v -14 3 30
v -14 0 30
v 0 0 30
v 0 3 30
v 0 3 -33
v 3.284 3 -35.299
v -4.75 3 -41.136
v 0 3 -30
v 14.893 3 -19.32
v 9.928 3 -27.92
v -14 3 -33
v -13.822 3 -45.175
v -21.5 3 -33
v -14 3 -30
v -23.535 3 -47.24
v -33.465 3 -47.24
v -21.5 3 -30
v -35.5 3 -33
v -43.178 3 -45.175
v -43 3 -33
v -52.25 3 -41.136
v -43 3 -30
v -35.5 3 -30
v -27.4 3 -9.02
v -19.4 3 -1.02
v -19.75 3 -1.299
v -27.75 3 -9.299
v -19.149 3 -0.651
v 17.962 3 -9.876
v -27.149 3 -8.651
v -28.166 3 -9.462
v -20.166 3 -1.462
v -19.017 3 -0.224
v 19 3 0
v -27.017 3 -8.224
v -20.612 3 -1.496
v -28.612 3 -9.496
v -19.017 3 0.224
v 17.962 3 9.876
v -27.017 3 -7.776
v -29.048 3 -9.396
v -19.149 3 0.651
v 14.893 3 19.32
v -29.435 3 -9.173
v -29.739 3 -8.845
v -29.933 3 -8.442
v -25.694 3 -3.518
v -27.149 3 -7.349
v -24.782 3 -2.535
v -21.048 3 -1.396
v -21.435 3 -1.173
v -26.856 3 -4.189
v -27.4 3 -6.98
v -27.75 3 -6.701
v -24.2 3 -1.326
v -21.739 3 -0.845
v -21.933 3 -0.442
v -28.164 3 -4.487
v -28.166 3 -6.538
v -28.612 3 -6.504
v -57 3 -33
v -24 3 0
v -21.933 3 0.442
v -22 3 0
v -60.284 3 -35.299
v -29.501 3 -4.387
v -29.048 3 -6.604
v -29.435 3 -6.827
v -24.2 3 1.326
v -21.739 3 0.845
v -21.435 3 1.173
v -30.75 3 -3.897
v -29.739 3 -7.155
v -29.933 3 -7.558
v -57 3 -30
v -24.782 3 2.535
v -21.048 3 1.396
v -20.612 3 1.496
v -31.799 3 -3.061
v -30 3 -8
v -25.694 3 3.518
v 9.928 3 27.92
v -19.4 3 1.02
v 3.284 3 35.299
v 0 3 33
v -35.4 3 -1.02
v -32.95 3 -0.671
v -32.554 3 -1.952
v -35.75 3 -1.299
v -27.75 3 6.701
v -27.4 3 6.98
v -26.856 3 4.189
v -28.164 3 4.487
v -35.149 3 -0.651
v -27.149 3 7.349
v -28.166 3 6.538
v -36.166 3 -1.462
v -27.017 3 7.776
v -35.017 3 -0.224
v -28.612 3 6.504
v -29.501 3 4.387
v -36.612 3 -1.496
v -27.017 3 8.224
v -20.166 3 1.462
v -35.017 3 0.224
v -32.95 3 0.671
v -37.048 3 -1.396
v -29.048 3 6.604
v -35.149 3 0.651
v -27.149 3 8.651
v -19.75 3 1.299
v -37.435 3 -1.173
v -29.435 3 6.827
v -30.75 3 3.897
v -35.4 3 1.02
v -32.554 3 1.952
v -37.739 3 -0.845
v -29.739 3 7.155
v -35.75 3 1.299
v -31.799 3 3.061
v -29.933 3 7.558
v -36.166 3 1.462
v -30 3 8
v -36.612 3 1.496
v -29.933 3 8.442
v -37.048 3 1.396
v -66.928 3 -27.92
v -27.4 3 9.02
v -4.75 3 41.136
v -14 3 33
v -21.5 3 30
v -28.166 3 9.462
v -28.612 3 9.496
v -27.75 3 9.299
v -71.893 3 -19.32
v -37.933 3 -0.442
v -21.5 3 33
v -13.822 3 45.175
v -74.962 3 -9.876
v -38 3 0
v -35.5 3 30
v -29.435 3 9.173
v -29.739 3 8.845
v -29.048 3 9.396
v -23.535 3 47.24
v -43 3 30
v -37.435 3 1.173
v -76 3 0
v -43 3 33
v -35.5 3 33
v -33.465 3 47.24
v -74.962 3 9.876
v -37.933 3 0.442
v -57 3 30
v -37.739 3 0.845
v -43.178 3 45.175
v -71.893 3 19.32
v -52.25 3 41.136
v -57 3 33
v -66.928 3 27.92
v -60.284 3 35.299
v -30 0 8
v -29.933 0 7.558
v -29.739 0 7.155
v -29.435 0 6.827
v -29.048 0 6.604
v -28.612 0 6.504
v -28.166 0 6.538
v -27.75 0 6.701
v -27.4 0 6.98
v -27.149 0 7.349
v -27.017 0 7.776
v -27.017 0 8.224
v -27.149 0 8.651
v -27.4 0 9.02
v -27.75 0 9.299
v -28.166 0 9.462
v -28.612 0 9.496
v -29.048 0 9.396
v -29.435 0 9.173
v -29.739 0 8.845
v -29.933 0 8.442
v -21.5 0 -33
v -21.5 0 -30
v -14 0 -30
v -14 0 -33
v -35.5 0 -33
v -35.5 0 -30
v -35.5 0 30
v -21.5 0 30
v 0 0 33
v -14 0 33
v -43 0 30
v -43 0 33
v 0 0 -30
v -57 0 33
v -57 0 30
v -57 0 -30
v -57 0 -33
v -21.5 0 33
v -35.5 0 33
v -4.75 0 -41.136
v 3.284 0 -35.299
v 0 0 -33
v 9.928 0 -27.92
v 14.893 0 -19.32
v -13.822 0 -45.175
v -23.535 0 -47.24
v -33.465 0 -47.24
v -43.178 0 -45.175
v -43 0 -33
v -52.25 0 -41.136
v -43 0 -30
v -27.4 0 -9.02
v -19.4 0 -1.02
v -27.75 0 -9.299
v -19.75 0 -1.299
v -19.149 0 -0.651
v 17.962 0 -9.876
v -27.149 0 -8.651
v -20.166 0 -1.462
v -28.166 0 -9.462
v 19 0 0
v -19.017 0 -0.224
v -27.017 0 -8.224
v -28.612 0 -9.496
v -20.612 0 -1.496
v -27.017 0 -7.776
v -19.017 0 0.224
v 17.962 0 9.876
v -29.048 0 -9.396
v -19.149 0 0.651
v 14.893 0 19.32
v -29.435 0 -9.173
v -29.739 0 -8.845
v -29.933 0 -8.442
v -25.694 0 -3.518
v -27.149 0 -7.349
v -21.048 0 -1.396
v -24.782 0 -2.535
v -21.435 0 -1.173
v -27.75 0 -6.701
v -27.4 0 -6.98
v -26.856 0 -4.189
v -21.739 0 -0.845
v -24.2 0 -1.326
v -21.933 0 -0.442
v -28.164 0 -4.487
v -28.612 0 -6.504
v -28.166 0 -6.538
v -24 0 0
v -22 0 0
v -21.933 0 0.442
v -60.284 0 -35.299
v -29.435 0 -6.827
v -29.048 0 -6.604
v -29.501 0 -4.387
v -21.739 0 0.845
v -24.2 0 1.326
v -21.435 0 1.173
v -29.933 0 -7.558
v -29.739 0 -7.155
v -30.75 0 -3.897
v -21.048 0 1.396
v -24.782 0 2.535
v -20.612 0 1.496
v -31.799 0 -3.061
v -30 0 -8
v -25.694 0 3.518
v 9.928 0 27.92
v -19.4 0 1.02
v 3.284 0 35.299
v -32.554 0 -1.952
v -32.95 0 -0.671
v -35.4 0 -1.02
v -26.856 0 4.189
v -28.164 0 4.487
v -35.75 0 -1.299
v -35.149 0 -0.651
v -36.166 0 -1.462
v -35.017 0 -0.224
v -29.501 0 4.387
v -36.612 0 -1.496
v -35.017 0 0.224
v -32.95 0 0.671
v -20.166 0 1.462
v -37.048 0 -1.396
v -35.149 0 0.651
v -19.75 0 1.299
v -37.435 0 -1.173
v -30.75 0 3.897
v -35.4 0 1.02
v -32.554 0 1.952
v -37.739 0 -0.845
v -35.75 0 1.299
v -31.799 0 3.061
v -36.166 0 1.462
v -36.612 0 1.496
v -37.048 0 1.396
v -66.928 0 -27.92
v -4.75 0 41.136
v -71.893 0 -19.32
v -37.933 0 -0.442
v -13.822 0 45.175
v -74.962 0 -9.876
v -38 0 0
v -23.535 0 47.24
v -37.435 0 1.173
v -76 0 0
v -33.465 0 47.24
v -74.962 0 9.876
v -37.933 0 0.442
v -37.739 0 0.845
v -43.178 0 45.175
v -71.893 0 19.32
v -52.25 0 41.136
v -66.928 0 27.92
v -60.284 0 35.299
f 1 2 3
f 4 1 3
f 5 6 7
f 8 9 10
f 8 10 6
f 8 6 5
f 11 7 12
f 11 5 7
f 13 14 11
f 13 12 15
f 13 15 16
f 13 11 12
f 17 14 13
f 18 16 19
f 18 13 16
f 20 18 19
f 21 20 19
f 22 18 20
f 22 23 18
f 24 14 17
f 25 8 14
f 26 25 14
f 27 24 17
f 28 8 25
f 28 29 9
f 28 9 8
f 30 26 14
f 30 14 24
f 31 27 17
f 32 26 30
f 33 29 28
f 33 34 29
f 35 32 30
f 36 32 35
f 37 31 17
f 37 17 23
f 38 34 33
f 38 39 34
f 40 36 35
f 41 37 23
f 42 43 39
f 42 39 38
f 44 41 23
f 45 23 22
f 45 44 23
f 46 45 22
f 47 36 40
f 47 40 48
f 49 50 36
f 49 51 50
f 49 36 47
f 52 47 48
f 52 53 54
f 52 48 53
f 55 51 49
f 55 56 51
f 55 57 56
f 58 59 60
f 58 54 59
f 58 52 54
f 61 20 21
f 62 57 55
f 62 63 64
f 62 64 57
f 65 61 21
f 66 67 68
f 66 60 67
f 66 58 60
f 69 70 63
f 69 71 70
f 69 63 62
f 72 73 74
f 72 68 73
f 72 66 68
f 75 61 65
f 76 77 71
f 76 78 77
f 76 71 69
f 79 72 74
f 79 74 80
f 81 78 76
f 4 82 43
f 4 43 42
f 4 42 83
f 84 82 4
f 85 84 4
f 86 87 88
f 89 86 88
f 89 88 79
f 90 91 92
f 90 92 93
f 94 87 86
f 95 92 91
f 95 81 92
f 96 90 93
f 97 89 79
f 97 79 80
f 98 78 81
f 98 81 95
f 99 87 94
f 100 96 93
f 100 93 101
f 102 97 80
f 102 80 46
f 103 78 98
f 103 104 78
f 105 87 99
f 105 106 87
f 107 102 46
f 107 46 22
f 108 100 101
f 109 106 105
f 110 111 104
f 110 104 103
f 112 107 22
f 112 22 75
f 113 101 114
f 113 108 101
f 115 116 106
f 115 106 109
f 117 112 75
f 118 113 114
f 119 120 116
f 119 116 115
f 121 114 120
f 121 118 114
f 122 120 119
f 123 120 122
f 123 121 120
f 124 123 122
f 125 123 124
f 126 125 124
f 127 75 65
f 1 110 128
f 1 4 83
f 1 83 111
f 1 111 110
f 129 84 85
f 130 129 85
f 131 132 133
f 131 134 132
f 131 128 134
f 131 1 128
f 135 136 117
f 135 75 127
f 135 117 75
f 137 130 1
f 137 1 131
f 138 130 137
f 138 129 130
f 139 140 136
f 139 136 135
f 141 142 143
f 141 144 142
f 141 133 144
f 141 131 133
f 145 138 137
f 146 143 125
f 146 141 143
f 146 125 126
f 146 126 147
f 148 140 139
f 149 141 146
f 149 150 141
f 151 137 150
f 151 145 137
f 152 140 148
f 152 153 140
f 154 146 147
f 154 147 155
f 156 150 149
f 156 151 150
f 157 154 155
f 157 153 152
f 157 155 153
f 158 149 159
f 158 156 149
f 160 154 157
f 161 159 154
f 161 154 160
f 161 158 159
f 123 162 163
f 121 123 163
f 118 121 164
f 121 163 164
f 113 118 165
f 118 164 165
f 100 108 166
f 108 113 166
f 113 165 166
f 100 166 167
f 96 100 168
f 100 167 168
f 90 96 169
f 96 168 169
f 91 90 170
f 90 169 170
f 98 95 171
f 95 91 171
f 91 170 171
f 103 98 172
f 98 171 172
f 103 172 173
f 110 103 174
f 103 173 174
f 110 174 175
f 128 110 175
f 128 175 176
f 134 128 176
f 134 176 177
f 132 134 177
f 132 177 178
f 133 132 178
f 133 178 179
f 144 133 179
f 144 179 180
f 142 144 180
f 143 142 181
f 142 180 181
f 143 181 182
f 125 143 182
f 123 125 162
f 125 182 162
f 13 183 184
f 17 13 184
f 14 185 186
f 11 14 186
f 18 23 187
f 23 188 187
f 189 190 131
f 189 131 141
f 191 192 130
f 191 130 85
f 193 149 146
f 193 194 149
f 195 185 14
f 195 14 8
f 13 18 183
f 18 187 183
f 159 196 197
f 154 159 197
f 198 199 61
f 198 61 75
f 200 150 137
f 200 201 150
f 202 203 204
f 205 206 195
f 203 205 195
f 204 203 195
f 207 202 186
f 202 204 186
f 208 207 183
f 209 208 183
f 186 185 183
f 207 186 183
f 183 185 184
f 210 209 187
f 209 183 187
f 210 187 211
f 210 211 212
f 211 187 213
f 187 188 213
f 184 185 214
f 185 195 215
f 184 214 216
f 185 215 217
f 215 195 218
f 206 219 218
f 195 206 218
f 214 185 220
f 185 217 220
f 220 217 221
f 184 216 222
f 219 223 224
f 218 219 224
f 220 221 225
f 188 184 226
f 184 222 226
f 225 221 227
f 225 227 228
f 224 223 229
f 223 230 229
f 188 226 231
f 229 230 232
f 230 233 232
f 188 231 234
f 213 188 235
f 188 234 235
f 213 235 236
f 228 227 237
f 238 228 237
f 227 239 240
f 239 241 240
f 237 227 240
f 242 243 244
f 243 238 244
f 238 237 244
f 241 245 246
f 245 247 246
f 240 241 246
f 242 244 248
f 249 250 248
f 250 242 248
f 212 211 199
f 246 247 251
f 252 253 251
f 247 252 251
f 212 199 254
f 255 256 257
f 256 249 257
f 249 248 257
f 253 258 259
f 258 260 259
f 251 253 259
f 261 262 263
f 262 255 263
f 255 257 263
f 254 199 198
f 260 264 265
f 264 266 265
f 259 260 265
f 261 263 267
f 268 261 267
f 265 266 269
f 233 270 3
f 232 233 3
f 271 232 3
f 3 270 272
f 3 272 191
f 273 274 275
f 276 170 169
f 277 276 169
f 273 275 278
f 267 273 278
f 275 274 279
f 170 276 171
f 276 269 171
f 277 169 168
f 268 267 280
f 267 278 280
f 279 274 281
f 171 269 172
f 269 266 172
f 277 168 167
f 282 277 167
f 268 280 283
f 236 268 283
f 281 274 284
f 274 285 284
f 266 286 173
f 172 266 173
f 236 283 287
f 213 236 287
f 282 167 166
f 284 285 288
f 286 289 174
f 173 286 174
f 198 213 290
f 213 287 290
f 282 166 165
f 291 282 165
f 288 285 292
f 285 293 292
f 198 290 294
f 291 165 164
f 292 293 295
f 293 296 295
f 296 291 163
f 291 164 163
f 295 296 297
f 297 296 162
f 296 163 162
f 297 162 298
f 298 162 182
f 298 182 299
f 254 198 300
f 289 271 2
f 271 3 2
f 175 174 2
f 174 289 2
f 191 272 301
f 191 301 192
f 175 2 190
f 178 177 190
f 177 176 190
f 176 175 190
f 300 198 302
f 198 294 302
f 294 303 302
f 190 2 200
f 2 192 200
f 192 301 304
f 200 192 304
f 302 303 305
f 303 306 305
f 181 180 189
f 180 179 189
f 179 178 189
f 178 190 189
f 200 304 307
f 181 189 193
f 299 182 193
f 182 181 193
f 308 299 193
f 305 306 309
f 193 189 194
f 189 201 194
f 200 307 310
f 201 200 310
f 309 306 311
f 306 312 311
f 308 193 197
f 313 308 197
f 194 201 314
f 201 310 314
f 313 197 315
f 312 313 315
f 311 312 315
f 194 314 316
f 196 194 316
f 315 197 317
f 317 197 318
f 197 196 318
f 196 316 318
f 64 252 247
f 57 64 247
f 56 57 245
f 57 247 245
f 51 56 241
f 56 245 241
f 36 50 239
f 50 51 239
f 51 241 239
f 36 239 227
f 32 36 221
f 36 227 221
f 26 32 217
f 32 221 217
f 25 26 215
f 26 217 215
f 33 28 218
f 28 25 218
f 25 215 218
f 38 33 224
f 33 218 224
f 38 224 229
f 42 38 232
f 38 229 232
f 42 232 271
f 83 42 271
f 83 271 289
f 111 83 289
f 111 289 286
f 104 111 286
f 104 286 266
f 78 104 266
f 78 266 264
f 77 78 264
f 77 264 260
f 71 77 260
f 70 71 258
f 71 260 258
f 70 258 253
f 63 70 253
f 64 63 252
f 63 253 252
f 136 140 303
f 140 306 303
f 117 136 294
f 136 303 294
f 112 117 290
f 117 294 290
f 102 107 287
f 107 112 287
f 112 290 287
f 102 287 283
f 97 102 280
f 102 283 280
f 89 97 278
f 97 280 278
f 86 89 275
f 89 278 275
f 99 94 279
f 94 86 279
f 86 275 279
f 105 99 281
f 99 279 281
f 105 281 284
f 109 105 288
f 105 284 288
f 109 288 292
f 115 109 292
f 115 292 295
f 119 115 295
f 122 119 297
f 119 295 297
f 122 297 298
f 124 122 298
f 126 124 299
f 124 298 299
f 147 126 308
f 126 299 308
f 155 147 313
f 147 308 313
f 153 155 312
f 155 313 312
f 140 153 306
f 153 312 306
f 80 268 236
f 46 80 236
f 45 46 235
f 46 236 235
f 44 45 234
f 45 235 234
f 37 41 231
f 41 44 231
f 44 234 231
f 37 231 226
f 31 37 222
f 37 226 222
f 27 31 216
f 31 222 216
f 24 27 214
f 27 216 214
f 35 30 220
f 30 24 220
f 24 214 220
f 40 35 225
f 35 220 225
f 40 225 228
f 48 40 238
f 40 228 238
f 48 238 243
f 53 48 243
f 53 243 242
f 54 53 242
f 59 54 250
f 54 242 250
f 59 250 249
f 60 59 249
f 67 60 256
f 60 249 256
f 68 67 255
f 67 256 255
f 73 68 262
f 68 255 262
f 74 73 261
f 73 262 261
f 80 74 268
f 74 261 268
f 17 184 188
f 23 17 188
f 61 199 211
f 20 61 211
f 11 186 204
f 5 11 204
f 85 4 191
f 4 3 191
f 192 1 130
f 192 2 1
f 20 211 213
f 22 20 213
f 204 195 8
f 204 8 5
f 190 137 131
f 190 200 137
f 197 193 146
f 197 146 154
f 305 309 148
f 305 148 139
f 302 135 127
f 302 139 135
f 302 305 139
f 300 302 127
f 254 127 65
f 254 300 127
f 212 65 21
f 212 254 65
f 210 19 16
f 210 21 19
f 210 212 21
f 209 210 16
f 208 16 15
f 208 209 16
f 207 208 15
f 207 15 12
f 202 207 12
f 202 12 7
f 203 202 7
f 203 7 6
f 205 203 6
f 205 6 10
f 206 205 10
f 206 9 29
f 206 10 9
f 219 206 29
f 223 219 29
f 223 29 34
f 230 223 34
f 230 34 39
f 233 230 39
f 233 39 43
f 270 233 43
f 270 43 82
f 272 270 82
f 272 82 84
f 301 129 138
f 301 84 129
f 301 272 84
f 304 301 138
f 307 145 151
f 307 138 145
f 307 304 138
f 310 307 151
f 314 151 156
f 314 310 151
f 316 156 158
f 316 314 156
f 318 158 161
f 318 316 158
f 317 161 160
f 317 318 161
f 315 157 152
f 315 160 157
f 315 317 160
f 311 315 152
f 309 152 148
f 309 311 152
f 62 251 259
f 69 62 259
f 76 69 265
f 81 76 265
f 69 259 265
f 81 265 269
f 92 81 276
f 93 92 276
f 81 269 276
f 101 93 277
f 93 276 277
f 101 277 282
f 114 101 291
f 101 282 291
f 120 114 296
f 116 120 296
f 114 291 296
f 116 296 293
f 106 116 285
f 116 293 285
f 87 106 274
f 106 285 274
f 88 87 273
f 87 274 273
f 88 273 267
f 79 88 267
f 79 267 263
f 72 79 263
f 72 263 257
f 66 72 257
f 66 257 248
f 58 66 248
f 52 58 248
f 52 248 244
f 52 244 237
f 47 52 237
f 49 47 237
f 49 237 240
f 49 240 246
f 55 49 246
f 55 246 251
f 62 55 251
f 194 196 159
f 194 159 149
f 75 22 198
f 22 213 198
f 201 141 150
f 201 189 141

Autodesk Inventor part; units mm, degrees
ref_plane "YZ Plane" through (0, 0, 0) normal (1, 0, 0) x (0, 1, 0)
ref_plane "XZ Plane" through (0, 0, 0) normal (0, 1, 0) x (-1, 0, 0)
ref_plane "XY Plane" through (0, 0, 0) normal (0, 0, 1) x (1, 0, 0)
sketch "Boceto1" plane through (0, 0, 0) normal (0, 1, 0) x (-1, 0, 0)
  circle A0 centre (28.5, 0) radius 1.5
  circle A1 centre (28.5, -8) radius 1.5
  circle A2 centre (28.5, 8) radius 1.5
  circle A3 centre (36.5, 0) radius 1.5
  circle A4 centre (20.5, 0) radius 1.5
  circle A5 centre (28.5, 0) radius 47.5
  line L0 (57, 33) -> (43, 33)
  line L1 (43, 33) -> (43, 30)
  line L2 (35.5, 30) -> (35.5, 33)
  line L3 (35.5, 33) -> (21.5, 33)
  line L4 (21.5, 33) -> (21.5, 30)
  line L5 (14, 30) -> (14, 33)
  line L6 (14, 33) -> (0, 33)
  line L7 (43, 30) -> (57, 30)
  line L8 (21.5, 30) -> (35.5, 30)
  line L9 (14, 30) -> (0, 30)
  line L10 (0, 30) -> (0, 33)
  line L11 (57, 33) -> (57, 30)
  line L12 (35.5, -30) -> (35.5, -33)
  line L13 (21.5, -30) -> (35.5, -30)
  line L14 (35.5, -33) -> (21.5, -33)
  line L15 (21.5, -33) -> (21.5, -30)
  line L16 (57, -33) -> (43, -33)
  line L17 (43, -33) -> (43, -30)
  line L18 (43, -30) -> (57, -30)
  line L19 (14, -30) -> (14, -33)
  line L20 (14, -30) -> (0, -30)
  line L21 (14, -33) -> (0, -33)
  line L22 (0, -30) -> (0, -33)
  line L23 (57, -33) -> (57, -30)
extrude "Extrusión1" add sketch "Boceto1" along normal blind 3
sketch "Boceto2" plane through (-28.5, 0, 0) normal (0, -1, 0) x (1, 0, 0)
  circle A0 centre (0, 0) radius 3.5
  point P0 (28.5, 0)
  dimension "d23" = 7
extrude "Extrusión2" cut sketch "Boceto2" against normal blind 10
sketch "Boceto3" plane through (-28.5, 0, 0) normal (0, -1, 0) x (1, 0, 0)
  circle A0 centre (0, 0) radius 4.5
  point P0 (28.5, 0)
  dimension "d26" = 9
extrude "Extrusión3" cut sketch "Boceto3" against normal blind 10
properties part number "base"
